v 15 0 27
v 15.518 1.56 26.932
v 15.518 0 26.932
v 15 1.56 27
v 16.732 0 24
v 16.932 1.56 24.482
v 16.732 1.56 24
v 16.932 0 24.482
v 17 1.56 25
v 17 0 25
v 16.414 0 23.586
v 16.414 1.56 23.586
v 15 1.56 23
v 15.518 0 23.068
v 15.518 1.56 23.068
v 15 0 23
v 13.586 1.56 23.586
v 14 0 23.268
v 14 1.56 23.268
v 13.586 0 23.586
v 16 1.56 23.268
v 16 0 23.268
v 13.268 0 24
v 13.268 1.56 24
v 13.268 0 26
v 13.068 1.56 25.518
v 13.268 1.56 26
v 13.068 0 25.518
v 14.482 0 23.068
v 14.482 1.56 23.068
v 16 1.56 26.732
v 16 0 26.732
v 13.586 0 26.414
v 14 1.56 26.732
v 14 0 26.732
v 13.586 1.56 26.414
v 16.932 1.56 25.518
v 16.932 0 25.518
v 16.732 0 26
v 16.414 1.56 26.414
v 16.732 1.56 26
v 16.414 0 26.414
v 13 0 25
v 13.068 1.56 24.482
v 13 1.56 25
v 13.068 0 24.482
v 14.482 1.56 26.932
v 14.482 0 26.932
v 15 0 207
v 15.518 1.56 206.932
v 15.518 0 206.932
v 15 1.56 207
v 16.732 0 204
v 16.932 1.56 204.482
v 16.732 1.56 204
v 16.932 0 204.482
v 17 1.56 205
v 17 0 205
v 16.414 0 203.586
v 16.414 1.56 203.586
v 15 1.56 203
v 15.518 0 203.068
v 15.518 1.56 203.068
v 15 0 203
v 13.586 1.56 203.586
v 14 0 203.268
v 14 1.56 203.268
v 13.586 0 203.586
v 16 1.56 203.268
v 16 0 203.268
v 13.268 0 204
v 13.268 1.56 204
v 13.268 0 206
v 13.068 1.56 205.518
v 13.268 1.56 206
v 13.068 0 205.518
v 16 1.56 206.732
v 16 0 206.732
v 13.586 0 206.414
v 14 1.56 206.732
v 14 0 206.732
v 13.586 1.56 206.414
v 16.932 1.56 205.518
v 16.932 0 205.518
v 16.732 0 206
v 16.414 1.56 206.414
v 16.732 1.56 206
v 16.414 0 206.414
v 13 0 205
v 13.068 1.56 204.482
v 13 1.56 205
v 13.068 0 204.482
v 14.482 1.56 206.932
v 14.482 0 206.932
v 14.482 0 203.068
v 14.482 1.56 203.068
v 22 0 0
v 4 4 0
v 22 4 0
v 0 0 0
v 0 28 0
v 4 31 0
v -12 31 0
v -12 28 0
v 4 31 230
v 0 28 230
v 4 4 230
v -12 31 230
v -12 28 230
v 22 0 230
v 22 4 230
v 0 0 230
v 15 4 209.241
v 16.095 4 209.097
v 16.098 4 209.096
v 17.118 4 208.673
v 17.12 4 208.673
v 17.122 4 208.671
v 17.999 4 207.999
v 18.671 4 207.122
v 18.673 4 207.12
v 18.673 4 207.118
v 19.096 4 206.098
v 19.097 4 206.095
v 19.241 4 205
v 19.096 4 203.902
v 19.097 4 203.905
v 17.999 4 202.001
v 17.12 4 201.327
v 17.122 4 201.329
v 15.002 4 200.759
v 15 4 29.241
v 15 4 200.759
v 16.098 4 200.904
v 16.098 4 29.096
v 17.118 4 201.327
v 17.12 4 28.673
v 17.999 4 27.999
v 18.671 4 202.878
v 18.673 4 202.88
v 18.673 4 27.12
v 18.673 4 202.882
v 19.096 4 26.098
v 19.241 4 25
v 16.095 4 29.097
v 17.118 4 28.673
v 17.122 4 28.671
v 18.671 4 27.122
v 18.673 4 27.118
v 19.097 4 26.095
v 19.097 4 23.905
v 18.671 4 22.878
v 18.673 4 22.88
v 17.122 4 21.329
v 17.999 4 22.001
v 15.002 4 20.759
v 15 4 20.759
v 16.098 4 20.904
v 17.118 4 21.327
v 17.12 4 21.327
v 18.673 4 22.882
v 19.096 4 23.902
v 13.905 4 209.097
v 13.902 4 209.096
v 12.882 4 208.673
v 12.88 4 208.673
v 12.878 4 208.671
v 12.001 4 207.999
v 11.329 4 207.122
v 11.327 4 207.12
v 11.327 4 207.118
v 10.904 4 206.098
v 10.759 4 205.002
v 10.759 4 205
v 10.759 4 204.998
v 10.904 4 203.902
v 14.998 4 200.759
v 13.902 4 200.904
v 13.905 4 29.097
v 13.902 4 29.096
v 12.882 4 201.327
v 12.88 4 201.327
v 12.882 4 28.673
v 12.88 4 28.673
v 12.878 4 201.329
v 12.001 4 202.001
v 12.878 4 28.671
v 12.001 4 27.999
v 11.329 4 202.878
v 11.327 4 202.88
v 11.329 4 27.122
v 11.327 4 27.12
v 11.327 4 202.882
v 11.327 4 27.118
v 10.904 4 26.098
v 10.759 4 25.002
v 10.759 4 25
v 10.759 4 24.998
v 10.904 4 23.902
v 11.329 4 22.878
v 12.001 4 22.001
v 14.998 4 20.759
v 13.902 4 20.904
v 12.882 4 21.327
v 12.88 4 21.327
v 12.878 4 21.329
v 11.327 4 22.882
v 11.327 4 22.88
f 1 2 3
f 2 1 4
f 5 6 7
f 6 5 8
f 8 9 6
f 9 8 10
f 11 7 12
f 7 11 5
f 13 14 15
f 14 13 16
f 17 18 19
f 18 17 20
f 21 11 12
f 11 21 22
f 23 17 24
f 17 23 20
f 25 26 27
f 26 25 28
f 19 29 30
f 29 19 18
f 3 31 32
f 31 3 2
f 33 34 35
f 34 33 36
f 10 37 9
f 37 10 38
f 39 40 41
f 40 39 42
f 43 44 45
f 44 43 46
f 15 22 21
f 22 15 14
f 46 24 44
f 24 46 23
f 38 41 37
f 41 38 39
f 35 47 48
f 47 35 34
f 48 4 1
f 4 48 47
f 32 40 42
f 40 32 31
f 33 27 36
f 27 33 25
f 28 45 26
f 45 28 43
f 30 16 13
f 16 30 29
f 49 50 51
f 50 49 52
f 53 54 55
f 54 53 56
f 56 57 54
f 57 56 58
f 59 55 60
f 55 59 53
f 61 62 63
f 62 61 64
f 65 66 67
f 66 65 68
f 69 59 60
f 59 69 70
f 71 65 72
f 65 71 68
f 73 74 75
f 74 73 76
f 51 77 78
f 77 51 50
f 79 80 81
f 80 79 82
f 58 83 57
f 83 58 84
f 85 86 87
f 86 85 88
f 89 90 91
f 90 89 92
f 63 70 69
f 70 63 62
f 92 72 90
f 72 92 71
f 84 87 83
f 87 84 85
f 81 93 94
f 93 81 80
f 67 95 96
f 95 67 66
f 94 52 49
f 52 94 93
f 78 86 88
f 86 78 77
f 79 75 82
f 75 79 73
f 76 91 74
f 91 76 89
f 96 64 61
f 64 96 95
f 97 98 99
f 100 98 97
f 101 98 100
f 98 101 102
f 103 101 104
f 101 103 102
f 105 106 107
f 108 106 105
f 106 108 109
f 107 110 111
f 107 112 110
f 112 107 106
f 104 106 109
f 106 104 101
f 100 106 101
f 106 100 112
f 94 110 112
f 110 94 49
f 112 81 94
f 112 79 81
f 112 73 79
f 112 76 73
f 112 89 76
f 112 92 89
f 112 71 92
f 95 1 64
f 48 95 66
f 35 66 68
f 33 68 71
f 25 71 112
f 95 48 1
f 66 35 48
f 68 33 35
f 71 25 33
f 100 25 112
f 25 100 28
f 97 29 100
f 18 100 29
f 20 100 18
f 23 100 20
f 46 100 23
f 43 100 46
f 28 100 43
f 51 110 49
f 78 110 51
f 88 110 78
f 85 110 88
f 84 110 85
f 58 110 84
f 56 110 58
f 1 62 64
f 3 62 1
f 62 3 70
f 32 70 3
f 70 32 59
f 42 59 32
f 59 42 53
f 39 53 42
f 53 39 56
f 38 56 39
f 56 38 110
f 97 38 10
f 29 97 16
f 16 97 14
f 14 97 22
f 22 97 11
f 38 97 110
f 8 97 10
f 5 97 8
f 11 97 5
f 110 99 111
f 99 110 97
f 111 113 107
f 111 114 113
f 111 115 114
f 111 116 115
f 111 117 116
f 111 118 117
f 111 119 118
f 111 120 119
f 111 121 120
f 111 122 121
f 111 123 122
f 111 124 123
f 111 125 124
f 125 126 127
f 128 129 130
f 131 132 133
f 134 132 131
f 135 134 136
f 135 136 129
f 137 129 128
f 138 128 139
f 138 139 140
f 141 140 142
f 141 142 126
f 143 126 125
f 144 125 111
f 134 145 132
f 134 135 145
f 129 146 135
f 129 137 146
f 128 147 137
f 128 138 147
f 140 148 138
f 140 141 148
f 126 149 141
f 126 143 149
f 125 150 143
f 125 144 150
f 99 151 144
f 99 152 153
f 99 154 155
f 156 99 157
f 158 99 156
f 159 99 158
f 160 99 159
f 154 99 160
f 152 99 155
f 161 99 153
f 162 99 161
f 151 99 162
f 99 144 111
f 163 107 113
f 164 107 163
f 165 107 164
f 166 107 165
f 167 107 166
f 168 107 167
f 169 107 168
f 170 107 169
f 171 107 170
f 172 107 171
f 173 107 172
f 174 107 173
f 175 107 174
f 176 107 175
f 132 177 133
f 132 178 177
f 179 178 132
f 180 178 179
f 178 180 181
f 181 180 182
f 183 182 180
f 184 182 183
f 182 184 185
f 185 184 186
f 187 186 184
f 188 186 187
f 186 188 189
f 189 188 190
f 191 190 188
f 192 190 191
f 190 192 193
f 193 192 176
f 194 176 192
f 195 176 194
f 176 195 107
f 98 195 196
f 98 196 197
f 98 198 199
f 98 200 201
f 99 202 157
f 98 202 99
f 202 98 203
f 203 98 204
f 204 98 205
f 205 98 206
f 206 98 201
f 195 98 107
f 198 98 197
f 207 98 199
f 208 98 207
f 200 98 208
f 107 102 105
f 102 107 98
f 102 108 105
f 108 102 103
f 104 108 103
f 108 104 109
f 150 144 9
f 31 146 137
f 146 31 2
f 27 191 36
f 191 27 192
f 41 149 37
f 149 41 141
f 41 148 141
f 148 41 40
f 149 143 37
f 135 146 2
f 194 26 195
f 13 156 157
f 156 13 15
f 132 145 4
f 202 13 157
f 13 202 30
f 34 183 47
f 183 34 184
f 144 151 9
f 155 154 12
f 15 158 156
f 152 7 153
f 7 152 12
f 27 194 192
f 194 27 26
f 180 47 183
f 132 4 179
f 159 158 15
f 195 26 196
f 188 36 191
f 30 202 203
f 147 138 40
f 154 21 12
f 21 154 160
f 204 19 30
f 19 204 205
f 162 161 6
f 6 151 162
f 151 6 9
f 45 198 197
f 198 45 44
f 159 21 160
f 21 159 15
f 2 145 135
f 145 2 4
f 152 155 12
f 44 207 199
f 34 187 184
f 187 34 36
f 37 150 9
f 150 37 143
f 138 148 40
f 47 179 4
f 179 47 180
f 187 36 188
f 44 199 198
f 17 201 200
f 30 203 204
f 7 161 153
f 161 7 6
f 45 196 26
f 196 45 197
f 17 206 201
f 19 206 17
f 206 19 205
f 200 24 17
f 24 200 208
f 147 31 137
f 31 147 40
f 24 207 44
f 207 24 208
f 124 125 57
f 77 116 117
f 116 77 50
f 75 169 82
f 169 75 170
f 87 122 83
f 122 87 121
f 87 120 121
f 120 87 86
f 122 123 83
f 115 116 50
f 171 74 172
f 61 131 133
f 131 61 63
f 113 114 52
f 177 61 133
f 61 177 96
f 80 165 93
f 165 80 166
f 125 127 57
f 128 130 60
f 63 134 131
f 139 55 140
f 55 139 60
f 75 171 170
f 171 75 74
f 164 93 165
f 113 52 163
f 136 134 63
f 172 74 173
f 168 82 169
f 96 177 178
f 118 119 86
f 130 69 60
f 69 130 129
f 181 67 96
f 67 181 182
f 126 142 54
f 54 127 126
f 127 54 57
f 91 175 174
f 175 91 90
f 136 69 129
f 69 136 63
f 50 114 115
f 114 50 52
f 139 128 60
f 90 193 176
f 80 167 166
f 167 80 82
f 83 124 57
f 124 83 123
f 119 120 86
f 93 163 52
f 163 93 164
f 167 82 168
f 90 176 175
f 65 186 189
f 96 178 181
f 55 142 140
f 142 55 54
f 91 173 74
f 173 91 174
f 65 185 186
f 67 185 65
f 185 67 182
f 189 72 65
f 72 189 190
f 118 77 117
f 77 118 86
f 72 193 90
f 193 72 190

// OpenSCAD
// Laptop sling under top B, between the ALEX 2 feet F5-F8, for the Dell Pro 16 Plus (PB16250:
// 358 x 251.4 x 21.35 mm, 1.84 kg). The laptop lies flat, lid closed, and slides in from top B's
// far end (z = 314, open floor there) with a SHORT side leading, so its 251 width runs between
// the feet (43 cm clear between the pads) and its 358 length runs along the wall, z 272 to 308
// when docked. Two C-rails screwed to the underside carry its long edges on 12 mm lips; a
// carriage at the inner end holds the dock's USB-C plug so the port on the leading side mates
// as the laptop reaches its stops: the stops take the push, the plug floats 1 mm in its clip.
//
// Rails: inner faces 253.4 apart (laptop + 2), centred on x = 31.5 cm, so at x 18.83 and 44.17
// cm; flange out toward the feet; #6 x 5/8 screws (3/4 through a 4 mm openGrid tile), 13 mm in.
// Four 230 mm segments make the two 46 cm rails (z 268 to 314, two per side, butted), the
// outer segment of each side flared at the mouth. Felt strip on the lips.
//
// MEASURE before printing the carriage (the rails need nothing measured):
//   which side leads (the side with the Thunderbolt ports), port centre from the laptop's
//   HINGE edge (port_from_hinge), port centre height above the laptop's underside (port_h),
//   the dock plug's overmould width, height and length (plug_body), how far the metal tongue
//   sticks out of the overmould (plug_tongue).
//   openscad -D part=\"rail\"     -o laptop-sling-rail-x2.stl       laptop-sling.scad
//   openscad -D part=\"mouth\"    -o laptop-sling-mouth-x2.stl      laptop-sling.scad
//   openscad -D part=\"carriage\" -o laptop-sling-carriage-x1.stl   laptop-sling.scad
// Print rails and mouths standing on the flange face (as saved), PETG, 4 walls, 30 %; the
// carriage flat on its back. Nothing here is test-printed; the rails are safe to print now.

part = "rail";
lap_w = 251.4; lap_t = 21.35; lap_l = 358;        // Dell Pro 16 Plus, SHI listing (MEASURE the thickness at the port side)
gap = 2;                                          // side play, total
clear_t = 24;                                     // under the flange to the lip: 2.65 over the laptop
wall = 4; flange = 18; flange_t = 4; lip = 12; lip_t = 3;
seg = 230; mouth_len = 60; flare = 6;
hole_d = 4.0; head_d = 8.5;                       // #6 clearance, countersink
port_from_hinge = 60;   // MEASURE: port centre from the hinge (back) edge, mm
port_h = 8.5;           // MEASURE: port centre above the laptop's underside, mm
plug_body = [22, 11, 35];   // MEASURE: the dock plug's overmould, width x height x length
plug_tongue = 8;        // MEASURE: metal tongue beyond the overmould (USB-C inserts about 6.5)
play = 1.0;             // the plug floats this much each way in its clip
stop_t = 6; carr_t = 6;

inner = lap_w + gap;                 // 253.4
H = flange_t + clear_t + lip_t;      // rail height, 31

module rail_profile(fl = flare) {    // x across (0 = inner face of the wall), y down from the top's underside
    translate([-fl, 0]) square([wall + flange + fl, flange_t]);                 // flange, out toward the feet
    translate([-fl, 0]) square([wall, H]);                                      // wall
    translate([-fl - lip, H - lip_t]) square([lip + wall, lip_t]);              // lip, in under the laptop
}
module rail(len, mouth = false) {    // along z; the mouth flares out over its last 30 mm
    difference() {
        union() {
            if (!mouth) linear_extrude(len) rail_profile(0);
            else {
                linear_extrude(len - 30) rail_profile(0);
                hull() { translate([0, 0, len - 30]) linear_extrude(0.01) rail_profile(0); translate([0, 0, len - 0.01]) linear_extrude(0.01) rail_profile(flare); }
            }
        }
        for (z = holes_z(len, mouth)) translate([wall + flange / 2 + 2, -1, z]) rotate([-90, 0, 0]) cylinder(d = hole_d, h = flange_t + 2, $fn = 24);   // through holes; the heads are countersunk from the flange's underside in rail_part()
    }
}
// The flange is against the top, so the heads must be on its underside: countersink from below.
module rail_part(len, mouth = false) difference() {
    rail(len, mouth);
    for (z = holes_z(len, mouth)) translate([wall + flange / 2 + 2, flange_t + 0.01, z]) rotate([90, 0, 0]) cylinder(d1 = head_d, d2 = hole_d, h = (head_d - hole_d) / 2 + 0.2, $fn = 24);
}
function holes_z(len, mouth) = mouth ? [20] : [25, len - 25];   // a mouth piece gets one screw, clear of its flare
module carriage() {   // y across the bay between the rails' inner faces, x = laptop thickness direction (0 at the lip top), z toward the laptop
    // a bar the width of the bay, carr_t thick, screwed up through two tabs; the laptop's leading edge meets the two stops
    // (one each end, 25 wide) and the plug tongue, set 1 mm short of bottoming, meets the port.
    bar_h = clear_t;
    difference() {
        union() {
            cube([inner, carr_t, bar_h]);                                                  // the bar: x along the bay, y toward the laptop, z up from the lip top
            for (x = [0, inner - 25]) translate([x, carr_t, 0]) cube([25, stop_t, bar_h]);  // stops
            for (x = [0, inner - 30]) translate([x, -12, bar_h]) cube([30, 12 + carr_t, flange_t]);   // screw tabs, inside the bay, rising past the rails' flange level to the top
            translate([port_x - plug_body[0] / 2 - play - 3, -plug_body[2] + carr_t, port_h - plug_body[1] / 2 - play - 3]) cube([plug_body[0] + 2 * play + 6, plug_body[2], plug_body[1] + 2 * play + 6]);   // plug clip block behind the bar
        }
        translate([port_x - plug_body[0] / 2 - play, -plug_body[2] + carr_t - 1, port_h - plug_body[1] / 2 - play]) cube([plug_body[0] + 2 * play, plug_body[2] + 2, plug_body[1] + 2 * play]);   // plug pocket, through the bar
        translate([port_x - plug_body[0] / 2 - play, -plug_body[2] + carr_t - 1, -1]) cube([plug_body[0] + 2 * play, plug_body[2] + 2, port_h + 1]);   // open underneath: the plug pushes up into the clip from below, a strip of tape or a zip tie keeps it
        for (x = [15, inner - 15]) translate([x, -6, bar_h - 1]) cylinder(d = hole_d, h = flange_t + 2, $fn = 24);
    }
}
port_x = port_from_hinge;   // hinge edge at x = 0 of the bay (hinge toward the wall); set port_from_hinge from the other edge if the hinge faces the room

if (part == "rail") rail_part(seg);
else if (part == "mouth") rail_part(mouth_len, true);
else if (part == "carriage") carriage();
